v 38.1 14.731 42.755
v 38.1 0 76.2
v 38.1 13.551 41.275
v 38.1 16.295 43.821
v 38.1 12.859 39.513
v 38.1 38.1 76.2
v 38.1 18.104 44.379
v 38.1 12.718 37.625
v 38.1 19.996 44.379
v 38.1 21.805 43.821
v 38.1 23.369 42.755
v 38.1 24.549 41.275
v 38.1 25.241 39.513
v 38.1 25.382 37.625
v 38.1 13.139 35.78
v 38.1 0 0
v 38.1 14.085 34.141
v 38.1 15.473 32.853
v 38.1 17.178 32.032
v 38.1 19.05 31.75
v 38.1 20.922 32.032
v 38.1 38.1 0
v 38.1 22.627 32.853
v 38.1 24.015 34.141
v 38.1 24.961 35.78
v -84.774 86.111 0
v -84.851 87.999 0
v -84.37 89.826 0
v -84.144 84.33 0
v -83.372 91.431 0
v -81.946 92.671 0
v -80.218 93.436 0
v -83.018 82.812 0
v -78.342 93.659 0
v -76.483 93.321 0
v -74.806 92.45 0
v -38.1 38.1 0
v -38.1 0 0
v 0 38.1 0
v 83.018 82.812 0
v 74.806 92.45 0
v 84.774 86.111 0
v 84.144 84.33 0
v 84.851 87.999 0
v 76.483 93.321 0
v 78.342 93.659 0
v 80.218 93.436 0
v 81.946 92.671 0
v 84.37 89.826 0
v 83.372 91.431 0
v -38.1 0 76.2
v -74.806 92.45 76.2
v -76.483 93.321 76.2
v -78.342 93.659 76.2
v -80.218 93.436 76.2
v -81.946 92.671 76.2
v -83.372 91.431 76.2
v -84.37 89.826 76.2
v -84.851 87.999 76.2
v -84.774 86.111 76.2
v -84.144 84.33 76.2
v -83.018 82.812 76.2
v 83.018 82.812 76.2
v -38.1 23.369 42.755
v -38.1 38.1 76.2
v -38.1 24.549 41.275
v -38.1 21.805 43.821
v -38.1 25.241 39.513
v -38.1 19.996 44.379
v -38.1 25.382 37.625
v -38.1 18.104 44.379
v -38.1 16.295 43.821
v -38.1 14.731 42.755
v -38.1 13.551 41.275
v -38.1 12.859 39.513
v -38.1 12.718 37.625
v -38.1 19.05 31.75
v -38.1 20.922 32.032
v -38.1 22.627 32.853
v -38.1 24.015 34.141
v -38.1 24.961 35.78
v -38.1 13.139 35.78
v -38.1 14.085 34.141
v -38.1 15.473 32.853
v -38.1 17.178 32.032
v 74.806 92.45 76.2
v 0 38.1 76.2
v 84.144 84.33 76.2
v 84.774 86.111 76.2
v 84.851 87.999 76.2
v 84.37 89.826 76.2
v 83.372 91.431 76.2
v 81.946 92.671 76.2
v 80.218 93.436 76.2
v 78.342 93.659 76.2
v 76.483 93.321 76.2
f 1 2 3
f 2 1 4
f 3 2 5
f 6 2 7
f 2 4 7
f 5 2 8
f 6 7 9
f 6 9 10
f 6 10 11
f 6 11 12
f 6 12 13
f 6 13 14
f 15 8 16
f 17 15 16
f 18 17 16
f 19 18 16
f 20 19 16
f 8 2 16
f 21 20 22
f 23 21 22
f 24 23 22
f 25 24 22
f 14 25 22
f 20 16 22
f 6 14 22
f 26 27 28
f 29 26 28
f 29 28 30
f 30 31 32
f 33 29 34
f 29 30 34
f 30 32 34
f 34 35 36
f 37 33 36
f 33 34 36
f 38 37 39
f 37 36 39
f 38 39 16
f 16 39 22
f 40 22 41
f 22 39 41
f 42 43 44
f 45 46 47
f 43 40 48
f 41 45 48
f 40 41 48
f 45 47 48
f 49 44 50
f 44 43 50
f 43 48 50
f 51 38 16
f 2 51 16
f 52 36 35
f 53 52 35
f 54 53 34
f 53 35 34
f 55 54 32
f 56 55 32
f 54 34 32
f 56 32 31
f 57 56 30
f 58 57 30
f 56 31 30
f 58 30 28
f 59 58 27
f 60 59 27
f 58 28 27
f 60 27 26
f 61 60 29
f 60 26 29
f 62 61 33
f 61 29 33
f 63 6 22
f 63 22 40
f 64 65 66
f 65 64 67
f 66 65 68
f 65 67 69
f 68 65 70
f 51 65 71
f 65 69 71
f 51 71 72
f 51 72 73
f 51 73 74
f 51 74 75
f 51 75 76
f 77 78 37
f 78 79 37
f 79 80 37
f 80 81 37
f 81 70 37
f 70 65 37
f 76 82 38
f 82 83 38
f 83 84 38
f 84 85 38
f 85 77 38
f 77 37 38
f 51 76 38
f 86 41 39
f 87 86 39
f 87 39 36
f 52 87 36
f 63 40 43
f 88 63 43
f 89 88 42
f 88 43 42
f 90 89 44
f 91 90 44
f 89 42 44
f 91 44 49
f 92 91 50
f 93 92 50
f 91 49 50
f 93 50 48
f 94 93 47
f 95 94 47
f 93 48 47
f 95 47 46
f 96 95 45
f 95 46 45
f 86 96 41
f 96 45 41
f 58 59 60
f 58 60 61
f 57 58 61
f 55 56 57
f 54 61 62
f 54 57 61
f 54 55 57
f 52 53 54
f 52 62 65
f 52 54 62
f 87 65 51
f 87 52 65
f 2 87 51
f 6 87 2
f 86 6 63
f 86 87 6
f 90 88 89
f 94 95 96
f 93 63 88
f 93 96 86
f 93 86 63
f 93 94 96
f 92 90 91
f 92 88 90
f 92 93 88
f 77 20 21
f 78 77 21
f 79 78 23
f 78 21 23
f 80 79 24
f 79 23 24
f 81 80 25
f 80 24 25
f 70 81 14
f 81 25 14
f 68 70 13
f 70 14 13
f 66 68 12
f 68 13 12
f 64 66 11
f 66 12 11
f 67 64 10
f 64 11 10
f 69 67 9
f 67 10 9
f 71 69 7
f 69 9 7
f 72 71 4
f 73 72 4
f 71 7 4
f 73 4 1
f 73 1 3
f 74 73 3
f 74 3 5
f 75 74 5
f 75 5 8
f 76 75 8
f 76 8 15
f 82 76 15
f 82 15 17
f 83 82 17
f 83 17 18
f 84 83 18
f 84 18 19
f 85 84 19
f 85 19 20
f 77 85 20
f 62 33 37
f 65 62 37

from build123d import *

# Parameters (mm, degrees)
BOSS_EXTRUDE1_DEPTH = 76.2
SKETCH2_R           = 6.35
CUT_EXTRUDE1_DEPTH  = 123.988460527


with BuildPart() as part:
    # Sketch1 → Boss-Extrude1 (new body)
    with BuildSketch(Plane.XY):
        with BuildLine():
            Line((-38.1, 0), (38.1, 0))
            Line((38.1, 0), (38.1, 38.1))
            Line((38.1, 38.1), (83.018247276, 82.81205439))
            ThreePointArc((83.018247276, 82.81205439), (83.371778793, 91.430938362), (74.806024175, 92.449757914))
            Line((74.806024175, 92.449757914), (0, 38.1))
            Line((0, 38.1), (-74.806024175, 92.449757914))
            ThreePointArc((-74.806024175, 92.449757914), (-83.371778793, 91.430938362), (-83.018247276, 82.81205439))
            Line((-83.018247276, 82.81205439), (-38.1, 38.1))
            Line((-38.1, 38.1), (-38.1, 0))
        make_face()
    extrude(amount=BOSS_EXTRUDE1_DEPTH)

    # Sketch2 → Cut-Extrude1 (cut, through all)
    with BuildSketch(Plane(origin=(38.1, 0, 0), x_dir=(0, 0, -1), z_dir=(1, 0, 0))):
        with Locations((-38.1, 19.05)):
            Circle(SKETCH2_R)
    extrude(amount=-CUT_EXTRUDE1_DEPTH, mode=Mode.SUBTRACT)


solid = part.part
